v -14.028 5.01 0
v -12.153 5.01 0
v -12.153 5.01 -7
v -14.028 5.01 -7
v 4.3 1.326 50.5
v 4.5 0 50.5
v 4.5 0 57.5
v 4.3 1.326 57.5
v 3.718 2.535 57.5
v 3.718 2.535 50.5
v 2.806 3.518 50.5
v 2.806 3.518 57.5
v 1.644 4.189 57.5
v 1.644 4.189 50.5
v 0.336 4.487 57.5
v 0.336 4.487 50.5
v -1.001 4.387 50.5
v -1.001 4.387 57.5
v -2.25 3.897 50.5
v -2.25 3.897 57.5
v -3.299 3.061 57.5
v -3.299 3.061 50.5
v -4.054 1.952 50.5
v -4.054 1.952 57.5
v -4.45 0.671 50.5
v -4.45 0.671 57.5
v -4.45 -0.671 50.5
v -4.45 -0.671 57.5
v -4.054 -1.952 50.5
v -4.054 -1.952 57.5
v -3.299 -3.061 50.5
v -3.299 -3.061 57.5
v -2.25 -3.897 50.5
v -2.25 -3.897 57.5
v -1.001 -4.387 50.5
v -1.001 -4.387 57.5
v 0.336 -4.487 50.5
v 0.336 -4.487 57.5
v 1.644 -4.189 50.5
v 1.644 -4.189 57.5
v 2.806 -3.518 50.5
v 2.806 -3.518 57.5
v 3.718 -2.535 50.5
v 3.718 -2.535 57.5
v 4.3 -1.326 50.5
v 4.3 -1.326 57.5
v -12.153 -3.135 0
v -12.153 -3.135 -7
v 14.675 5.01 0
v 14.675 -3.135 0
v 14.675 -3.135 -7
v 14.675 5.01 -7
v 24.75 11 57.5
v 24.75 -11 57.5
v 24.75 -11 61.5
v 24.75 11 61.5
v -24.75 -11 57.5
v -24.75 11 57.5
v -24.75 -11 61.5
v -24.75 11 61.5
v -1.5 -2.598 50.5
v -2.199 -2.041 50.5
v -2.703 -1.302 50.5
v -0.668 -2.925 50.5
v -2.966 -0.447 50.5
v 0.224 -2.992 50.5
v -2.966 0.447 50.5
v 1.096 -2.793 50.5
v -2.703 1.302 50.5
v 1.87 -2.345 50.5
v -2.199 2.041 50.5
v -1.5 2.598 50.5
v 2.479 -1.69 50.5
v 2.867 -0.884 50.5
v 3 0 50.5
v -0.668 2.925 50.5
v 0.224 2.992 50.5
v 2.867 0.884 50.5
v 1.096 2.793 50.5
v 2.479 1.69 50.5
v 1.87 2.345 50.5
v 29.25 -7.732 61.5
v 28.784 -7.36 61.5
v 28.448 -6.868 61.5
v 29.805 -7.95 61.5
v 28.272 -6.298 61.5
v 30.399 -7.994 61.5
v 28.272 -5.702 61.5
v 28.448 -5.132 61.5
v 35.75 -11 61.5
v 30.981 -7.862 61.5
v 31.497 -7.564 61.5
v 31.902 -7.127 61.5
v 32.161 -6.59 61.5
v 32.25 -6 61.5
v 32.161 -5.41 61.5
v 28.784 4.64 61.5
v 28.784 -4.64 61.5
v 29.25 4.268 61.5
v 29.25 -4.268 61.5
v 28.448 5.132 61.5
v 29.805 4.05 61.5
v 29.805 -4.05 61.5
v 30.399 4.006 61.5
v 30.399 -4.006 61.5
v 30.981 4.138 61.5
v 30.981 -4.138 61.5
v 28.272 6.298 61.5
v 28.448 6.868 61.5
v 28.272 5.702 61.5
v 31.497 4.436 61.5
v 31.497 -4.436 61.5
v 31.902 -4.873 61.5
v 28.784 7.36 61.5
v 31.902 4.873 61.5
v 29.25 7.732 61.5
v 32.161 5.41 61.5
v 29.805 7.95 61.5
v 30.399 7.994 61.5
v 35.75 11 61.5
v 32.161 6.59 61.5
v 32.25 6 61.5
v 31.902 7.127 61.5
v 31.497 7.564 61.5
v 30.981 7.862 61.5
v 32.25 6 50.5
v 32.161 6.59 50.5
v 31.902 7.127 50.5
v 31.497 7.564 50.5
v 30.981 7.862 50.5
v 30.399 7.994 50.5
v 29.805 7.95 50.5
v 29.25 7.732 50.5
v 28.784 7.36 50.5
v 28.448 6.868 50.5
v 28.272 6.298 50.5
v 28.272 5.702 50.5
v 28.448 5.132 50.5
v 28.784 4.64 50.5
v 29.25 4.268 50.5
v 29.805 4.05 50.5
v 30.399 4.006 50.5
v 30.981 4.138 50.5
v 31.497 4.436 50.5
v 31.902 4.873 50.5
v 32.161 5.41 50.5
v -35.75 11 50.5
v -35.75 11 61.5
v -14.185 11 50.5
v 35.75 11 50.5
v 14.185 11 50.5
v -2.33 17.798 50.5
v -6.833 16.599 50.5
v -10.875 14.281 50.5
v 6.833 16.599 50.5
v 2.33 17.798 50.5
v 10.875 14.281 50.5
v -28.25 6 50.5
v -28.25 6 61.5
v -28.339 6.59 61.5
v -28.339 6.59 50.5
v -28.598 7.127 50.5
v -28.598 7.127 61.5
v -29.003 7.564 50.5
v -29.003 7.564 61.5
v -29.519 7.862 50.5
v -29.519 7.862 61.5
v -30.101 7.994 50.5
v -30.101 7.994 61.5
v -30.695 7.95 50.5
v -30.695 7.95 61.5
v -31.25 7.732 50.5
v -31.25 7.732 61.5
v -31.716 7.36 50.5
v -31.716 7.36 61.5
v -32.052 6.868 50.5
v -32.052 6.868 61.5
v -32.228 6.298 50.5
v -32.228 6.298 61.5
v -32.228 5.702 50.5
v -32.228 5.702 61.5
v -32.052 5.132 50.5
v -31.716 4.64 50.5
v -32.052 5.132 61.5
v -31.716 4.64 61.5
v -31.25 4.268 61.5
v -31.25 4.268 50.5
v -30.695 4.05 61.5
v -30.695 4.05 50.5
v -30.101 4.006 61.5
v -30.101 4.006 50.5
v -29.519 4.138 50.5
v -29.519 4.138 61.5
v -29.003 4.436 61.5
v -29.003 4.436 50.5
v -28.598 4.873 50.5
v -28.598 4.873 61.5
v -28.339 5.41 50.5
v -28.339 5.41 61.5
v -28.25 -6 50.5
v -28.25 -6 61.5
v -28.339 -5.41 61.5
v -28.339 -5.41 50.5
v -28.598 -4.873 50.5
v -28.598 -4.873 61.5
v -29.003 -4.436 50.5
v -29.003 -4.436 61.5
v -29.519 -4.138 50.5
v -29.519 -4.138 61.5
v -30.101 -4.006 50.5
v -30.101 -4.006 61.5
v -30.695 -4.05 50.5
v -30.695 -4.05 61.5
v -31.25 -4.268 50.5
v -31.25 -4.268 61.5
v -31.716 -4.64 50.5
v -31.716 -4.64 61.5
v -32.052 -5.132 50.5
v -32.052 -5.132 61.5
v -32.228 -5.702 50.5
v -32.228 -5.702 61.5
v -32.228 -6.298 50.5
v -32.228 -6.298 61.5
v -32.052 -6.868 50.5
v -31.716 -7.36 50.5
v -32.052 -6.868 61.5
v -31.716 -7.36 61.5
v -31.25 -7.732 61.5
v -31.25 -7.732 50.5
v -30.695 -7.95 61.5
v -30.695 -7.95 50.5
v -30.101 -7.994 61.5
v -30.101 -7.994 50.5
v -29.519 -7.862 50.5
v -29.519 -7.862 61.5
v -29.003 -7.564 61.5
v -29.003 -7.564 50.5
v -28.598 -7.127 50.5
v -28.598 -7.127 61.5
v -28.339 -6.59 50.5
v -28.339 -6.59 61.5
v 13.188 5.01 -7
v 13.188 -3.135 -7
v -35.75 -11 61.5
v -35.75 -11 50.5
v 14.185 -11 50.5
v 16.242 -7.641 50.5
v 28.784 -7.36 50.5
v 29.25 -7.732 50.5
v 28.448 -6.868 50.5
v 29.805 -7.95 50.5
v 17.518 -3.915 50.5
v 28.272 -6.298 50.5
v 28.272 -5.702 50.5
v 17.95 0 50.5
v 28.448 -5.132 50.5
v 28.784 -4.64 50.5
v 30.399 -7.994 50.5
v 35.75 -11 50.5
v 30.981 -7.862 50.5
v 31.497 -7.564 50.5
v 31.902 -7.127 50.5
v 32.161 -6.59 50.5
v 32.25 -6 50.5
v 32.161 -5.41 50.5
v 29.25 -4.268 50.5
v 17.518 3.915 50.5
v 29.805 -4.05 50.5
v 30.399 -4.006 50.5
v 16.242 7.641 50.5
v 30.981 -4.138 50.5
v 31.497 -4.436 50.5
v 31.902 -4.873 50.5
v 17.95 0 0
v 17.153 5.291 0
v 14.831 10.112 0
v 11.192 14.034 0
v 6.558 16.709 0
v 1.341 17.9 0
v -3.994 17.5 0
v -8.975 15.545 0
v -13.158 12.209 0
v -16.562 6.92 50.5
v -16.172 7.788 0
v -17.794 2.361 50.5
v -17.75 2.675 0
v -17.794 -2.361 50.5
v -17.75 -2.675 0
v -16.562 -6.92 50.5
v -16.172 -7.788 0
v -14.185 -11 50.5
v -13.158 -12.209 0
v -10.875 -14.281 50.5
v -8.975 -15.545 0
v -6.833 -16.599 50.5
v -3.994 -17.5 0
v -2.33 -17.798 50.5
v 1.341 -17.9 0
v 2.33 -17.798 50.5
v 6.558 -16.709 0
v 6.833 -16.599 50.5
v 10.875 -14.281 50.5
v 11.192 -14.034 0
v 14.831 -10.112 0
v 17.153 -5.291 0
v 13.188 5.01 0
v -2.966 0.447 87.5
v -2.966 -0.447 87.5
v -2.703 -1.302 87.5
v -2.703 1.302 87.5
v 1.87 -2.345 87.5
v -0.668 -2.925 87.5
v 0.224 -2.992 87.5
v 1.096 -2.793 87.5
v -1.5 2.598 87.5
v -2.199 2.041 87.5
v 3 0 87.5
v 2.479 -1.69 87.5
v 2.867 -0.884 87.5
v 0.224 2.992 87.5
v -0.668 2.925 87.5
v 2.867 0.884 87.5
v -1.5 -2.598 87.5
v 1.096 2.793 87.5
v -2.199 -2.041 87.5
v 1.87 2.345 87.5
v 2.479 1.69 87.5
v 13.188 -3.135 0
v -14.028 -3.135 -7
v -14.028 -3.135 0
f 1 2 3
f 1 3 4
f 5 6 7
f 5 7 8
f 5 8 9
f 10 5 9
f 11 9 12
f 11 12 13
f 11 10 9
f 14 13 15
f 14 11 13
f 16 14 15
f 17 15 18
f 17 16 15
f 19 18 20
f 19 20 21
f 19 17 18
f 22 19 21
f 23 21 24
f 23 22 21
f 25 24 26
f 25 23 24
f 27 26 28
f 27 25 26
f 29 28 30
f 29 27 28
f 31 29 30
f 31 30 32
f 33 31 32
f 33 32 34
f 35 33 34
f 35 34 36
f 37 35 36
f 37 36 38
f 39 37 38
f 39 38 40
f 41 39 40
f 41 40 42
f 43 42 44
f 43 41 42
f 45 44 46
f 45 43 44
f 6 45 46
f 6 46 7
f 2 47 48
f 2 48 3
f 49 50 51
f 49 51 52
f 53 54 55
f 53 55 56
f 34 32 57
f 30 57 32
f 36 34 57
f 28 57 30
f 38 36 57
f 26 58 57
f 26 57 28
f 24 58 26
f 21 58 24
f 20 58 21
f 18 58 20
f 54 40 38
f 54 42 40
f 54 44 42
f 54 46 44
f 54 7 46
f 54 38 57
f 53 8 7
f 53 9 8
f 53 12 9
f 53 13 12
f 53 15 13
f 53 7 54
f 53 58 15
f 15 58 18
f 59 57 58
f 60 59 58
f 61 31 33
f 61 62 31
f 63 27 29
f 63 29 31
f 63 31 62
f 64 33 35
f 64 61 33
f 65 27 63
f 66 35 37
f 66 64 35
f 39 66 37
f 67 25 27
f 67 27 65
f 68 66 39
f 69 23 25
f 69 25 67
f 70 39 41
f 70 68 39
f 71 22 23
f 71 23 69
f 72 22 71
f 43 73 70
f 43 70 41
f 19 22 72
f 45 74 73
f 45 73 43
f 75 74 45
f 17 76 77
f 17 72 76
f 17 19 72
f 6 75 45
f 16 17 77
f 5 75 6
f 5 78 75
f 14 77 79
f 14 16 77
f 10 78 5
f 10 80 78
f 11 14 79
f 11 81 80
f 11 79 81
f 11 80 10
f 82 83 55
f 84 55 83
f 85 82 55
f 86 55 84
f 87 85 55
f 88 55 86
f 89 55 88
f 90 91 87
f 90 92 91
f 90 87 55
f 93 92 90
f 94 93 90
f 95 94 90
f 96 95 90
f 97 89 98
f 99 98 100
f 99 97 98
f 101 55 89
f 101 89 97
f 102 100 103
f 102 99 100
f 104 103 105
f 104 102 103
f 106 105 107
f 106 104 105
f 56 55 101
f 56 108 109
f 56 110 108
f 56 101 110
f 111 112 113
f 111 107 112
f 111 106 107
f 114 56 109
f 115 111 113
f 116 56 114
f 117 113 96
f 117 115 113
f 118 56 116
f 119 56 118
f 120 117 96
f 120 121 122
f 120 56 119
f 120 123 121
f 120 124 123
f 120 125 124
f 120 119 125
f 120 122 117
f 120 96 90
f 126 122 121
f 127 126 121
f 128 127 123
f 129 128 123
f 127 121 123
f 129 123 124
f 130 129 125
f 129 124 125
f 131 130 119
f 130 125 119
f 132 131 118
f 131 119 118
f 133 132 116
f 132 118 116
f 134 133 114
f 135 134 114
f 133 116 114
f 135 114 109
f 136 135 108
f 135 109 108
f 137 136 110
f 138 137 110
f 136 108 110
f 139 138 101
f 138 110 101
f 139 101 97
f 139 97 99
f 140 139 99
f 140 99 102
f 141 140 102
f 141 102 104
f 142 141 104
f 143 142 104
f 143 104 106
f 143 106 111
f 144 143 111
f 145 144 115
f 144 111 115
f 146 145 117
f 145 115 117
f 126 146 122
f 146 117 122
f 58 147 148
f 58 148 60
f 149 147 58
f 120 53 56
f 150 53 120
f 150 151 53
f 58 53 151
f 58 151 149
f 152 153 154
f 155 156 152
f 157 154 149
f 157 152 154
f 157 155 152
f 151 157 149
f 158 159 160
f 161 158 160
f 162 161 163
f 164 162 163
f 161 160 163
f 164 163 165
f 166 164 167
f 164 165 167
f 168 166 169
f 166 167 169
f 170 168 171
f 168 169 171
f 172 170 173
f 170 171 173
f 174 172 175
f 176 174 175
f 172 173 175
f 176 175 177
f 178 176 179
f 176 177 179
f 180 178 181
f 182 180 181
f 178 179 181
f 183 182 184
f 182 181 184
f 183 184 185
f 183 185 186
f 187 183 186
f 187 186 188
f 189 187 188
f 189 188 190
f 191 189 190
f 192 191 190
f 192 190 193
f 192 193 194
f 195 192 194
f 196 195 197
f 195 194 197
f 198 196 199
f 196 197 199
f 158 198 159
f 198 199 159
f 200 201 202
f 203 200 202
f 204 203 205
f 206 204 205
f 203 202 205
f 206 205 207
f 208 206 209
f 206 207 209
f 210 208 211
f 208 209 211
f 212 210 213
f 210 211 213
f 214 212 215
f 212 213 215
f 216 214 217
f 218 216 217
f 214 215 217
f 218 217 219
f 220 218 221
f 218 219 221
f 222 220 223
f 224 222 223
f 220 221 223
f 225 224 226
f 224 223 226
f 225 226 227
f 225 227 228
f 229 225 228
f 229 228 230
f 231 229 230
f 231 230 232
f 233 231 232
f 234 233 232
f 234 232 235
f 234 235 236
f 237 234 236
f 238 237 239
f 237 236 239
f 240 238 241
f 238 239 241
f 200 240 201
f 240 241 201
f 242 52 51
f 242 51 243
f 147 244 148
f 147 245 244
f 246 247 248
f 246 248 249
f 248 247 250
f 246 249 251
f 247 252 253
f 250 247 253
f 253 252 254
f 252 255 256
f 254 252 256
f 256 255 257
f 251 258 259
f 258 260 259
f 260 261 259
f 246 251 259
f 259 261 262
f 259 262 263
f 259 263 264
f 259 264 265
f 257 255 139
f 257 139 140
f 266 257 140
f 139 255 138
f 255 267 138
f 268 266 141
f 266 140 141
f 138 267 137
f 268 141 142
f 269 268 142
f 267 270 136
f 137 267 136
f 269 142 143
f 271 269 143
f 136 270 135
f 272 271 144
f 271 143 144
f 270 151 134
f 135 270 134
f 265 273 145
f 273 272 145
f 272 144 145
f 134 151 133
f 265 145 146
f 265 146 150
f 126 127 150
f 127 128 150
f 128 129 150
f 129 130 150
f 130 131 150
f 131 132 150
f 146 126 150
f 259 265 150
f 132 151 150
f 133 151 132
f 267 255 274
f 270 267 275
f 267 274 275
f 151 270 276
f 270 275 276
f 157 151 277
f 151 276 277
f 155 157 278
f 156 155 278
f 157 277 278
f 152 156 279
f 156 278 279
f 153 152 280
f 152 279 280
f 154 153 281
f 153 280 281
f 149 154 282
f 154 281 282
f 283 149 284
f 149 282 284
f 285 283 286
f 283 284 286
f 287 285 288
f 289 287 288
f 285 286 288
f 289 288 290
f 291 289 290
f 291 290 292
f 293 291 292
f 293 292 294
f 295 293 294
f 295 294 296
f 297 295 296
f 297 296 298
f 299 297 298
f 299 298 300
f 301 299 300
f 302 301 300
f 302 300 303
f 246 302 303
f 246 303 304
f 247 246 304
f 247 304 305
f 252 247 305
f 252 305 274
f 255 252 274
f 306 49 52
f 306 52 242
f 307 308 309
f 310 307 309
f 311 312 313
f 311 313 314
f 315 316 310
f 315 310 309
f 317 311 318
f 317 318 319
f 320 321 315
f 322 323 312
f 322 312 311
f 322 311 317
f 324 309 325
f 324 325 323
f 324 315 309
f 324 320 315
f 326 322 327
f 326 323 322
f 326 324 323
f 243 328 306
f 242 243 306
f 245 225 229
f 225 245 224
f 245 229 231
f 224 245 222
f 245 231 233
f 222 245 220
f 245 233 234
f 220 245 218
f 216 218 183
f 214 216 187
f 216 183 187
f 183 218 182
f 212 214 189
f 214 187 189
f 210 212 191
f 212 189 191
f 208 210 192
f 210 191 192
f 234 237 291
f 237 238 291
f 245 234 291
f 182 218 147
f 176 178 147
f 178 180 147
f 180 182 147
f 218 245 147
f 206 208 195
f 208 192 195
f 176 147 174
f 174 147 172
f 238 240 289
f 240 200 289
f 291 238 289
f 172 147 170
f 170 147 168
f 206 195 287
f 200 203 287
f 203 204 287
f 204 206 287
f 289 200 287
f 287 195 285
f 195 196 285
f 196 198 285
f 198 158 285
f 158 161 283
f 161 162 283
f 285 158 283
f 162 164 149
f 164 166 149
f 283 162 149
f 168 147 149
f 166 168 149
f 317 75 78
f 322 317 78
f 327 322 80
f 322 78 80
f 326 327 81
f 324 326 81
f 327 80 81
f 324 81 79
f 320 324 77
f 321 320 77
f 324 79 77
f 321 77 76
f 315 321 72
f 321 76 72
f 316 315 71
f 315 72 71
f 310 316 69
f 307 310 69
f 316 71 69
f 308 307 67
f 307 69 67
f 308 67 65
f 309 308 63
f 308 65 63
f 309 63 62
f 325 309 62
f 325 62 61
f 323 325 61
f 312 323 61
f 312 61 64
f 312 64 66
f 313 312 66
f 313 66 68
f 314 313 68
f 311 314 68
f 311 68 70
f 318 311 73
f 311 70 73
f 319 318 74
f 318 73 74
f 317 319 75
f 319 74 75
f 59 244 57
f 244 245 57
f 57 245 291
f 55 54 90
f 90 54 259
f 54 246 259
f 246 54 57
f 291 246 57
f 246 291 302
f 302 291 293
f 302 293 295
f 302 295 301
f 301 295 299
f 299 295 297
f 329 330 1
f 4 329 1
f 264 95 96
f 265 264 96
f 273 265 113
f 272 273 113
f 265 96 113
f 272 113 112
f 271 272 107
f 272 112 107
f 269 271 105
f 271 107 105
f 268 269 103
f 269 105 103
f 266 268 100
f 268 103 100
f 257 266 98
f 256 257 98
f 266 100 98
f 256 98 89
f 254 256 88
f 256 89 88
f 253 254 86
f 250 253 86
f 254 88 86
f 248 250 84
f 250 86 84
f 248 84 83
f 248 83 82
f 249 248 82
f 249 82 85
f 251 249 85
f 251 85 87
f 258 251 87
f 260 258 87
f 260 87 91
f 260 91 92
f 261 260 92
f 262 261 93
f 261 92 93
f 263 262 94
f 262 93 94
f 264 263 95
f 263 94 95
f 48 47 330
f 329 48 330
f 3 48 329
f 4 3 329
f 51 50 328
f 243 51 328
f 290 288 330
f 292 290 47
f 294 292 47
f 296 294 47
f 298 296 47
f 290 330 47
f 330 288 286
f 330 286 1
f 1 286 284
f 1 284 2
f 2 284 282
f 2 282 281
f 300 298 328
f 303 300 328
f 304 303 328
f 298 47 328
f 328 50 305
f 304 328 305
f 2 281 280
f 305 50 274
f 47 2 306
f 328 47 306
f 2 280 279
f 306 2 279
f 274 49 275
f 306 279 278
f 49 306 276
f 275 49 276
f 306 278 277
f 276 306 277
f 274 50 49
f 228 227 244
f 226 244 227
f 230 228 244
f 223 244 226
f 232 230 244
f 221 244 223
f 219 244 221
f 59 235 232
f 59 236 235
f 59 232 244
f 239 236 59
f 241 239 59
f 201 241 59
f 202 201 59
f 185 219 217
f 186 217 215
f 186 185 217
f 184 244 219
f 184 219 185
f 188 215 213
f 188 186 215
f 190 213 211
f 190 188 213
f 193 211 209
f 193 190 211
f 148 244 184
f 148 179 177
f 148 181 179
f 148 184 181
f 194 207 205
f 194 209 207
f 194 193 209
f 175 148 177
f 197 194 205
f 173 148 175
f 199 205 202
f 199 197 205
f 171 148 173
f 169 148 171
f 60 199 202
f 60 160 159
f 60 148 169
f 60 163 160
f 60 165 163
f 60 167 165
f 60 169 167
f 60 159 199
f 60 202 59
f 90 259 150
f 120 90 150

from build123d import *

# Parameters (mm, degrees)
SKETCH1_R           = 17.95
BOSS_EXTRUDE1_DEPTH = 50.5
SKETCH2_R           = 3
BOSS_EXTRUDE2_DEPTH = 37
SKETCH3_W           = 71.5
SKETCH3_H           = 22
SKETCH3_R           = 4.5
BOSS_EXTRUDE3_DEPTH = 7
SKETCH4_W           = 11
SKETCH4_H           = 22
BOSS_EXTRUDE4_DEPTH = 4
SKETCH5_R           = 2
CUT_EXTRUDE1_DEPTH  = 11
SKETCH6_W           = 1.486858086
SKETCH6_H           = 8.145396468
SKETCH6_W_2         = 1.874734108
BOSS_EXTRUDE6_DEPTH = 7


with BuildPart() as part:
    # Sketch1 → Boss-Extrude1 (new body)
    with BuildSketch(Plane.XY):
        Circle(SKETCH1_R)
    extrude(amount=BOSS_EXTRUDE1_DEPTH)

    # Sketch2 → Boss-Extrude2 (add)
    with BuildSketch(Plane.XY.offset(50.5)):
        Circle(SKETCH2_R)
    extrude(amount=BOSS_EXTRUDE2_DEPTH)

    # Sketch3 → Boss-Extrude3 (add)
    with BuildSketch(Plane.XY.offset(50.5)):
        Rectangle(SKETCH3_W, SKETCH3_H)
        Circle(SKETCH3_R, mode=Mode.SUBTRACT)
    extrude(amount=BOSS_EXTRUDE3_DEPTH)

    # Sketch4 → Boss-Extrude4 (add)
    with BuildSketch(Plane.XY.offset(57.5)):
        with Locations((-30.25, 0)):
            Rectangle(SKETCH4_W, SKETCH4_H)
        with Locations((30.25, 0)):
            Rectangle(SKETCH4_W, SKETCH4_H)
    extrude(amount=BOSS_EXTRUDE4_DEPTH)

    # Sketch5 → Cut-Extrude1 (cut)
    with BuildSketch(Plane.XY.offset(61.5)):
        with Locations((-30.25, 6)):
            Circle(SKETCH5_R)
        with Locations((-30.25, -6)):
            Circle(SKETCH5_R)
        with Locations((30.25, -6)):
            Circle(SKETCH5_R)
        with Locations((30.25, 6)):
            Circle(SKETCH5_R)
    extrude(amount=-CUT_EXTRUDE1_DEPTH, mode=Mode.SUBTRACT)

    # Sketch6 → Boss-Extrude6 (add)
    with BuildSketch(Plane(origin=(0, 0, 0), x_dir=(-1, 0, 0), z_dir=(0, 0, -1))):
        with Locations((-13.9312138, 0.937367054)):
            Rectangle(SKETCH6_W, SKETCH6_H)
        with Locations((13.090815752, 0.937367054)):
            Rectangle(SKETCH6_W_2, SKETCH6_H)
    extrude(amount=BOSS_EXTRUDE6_DEPTH)


solid = part.part
